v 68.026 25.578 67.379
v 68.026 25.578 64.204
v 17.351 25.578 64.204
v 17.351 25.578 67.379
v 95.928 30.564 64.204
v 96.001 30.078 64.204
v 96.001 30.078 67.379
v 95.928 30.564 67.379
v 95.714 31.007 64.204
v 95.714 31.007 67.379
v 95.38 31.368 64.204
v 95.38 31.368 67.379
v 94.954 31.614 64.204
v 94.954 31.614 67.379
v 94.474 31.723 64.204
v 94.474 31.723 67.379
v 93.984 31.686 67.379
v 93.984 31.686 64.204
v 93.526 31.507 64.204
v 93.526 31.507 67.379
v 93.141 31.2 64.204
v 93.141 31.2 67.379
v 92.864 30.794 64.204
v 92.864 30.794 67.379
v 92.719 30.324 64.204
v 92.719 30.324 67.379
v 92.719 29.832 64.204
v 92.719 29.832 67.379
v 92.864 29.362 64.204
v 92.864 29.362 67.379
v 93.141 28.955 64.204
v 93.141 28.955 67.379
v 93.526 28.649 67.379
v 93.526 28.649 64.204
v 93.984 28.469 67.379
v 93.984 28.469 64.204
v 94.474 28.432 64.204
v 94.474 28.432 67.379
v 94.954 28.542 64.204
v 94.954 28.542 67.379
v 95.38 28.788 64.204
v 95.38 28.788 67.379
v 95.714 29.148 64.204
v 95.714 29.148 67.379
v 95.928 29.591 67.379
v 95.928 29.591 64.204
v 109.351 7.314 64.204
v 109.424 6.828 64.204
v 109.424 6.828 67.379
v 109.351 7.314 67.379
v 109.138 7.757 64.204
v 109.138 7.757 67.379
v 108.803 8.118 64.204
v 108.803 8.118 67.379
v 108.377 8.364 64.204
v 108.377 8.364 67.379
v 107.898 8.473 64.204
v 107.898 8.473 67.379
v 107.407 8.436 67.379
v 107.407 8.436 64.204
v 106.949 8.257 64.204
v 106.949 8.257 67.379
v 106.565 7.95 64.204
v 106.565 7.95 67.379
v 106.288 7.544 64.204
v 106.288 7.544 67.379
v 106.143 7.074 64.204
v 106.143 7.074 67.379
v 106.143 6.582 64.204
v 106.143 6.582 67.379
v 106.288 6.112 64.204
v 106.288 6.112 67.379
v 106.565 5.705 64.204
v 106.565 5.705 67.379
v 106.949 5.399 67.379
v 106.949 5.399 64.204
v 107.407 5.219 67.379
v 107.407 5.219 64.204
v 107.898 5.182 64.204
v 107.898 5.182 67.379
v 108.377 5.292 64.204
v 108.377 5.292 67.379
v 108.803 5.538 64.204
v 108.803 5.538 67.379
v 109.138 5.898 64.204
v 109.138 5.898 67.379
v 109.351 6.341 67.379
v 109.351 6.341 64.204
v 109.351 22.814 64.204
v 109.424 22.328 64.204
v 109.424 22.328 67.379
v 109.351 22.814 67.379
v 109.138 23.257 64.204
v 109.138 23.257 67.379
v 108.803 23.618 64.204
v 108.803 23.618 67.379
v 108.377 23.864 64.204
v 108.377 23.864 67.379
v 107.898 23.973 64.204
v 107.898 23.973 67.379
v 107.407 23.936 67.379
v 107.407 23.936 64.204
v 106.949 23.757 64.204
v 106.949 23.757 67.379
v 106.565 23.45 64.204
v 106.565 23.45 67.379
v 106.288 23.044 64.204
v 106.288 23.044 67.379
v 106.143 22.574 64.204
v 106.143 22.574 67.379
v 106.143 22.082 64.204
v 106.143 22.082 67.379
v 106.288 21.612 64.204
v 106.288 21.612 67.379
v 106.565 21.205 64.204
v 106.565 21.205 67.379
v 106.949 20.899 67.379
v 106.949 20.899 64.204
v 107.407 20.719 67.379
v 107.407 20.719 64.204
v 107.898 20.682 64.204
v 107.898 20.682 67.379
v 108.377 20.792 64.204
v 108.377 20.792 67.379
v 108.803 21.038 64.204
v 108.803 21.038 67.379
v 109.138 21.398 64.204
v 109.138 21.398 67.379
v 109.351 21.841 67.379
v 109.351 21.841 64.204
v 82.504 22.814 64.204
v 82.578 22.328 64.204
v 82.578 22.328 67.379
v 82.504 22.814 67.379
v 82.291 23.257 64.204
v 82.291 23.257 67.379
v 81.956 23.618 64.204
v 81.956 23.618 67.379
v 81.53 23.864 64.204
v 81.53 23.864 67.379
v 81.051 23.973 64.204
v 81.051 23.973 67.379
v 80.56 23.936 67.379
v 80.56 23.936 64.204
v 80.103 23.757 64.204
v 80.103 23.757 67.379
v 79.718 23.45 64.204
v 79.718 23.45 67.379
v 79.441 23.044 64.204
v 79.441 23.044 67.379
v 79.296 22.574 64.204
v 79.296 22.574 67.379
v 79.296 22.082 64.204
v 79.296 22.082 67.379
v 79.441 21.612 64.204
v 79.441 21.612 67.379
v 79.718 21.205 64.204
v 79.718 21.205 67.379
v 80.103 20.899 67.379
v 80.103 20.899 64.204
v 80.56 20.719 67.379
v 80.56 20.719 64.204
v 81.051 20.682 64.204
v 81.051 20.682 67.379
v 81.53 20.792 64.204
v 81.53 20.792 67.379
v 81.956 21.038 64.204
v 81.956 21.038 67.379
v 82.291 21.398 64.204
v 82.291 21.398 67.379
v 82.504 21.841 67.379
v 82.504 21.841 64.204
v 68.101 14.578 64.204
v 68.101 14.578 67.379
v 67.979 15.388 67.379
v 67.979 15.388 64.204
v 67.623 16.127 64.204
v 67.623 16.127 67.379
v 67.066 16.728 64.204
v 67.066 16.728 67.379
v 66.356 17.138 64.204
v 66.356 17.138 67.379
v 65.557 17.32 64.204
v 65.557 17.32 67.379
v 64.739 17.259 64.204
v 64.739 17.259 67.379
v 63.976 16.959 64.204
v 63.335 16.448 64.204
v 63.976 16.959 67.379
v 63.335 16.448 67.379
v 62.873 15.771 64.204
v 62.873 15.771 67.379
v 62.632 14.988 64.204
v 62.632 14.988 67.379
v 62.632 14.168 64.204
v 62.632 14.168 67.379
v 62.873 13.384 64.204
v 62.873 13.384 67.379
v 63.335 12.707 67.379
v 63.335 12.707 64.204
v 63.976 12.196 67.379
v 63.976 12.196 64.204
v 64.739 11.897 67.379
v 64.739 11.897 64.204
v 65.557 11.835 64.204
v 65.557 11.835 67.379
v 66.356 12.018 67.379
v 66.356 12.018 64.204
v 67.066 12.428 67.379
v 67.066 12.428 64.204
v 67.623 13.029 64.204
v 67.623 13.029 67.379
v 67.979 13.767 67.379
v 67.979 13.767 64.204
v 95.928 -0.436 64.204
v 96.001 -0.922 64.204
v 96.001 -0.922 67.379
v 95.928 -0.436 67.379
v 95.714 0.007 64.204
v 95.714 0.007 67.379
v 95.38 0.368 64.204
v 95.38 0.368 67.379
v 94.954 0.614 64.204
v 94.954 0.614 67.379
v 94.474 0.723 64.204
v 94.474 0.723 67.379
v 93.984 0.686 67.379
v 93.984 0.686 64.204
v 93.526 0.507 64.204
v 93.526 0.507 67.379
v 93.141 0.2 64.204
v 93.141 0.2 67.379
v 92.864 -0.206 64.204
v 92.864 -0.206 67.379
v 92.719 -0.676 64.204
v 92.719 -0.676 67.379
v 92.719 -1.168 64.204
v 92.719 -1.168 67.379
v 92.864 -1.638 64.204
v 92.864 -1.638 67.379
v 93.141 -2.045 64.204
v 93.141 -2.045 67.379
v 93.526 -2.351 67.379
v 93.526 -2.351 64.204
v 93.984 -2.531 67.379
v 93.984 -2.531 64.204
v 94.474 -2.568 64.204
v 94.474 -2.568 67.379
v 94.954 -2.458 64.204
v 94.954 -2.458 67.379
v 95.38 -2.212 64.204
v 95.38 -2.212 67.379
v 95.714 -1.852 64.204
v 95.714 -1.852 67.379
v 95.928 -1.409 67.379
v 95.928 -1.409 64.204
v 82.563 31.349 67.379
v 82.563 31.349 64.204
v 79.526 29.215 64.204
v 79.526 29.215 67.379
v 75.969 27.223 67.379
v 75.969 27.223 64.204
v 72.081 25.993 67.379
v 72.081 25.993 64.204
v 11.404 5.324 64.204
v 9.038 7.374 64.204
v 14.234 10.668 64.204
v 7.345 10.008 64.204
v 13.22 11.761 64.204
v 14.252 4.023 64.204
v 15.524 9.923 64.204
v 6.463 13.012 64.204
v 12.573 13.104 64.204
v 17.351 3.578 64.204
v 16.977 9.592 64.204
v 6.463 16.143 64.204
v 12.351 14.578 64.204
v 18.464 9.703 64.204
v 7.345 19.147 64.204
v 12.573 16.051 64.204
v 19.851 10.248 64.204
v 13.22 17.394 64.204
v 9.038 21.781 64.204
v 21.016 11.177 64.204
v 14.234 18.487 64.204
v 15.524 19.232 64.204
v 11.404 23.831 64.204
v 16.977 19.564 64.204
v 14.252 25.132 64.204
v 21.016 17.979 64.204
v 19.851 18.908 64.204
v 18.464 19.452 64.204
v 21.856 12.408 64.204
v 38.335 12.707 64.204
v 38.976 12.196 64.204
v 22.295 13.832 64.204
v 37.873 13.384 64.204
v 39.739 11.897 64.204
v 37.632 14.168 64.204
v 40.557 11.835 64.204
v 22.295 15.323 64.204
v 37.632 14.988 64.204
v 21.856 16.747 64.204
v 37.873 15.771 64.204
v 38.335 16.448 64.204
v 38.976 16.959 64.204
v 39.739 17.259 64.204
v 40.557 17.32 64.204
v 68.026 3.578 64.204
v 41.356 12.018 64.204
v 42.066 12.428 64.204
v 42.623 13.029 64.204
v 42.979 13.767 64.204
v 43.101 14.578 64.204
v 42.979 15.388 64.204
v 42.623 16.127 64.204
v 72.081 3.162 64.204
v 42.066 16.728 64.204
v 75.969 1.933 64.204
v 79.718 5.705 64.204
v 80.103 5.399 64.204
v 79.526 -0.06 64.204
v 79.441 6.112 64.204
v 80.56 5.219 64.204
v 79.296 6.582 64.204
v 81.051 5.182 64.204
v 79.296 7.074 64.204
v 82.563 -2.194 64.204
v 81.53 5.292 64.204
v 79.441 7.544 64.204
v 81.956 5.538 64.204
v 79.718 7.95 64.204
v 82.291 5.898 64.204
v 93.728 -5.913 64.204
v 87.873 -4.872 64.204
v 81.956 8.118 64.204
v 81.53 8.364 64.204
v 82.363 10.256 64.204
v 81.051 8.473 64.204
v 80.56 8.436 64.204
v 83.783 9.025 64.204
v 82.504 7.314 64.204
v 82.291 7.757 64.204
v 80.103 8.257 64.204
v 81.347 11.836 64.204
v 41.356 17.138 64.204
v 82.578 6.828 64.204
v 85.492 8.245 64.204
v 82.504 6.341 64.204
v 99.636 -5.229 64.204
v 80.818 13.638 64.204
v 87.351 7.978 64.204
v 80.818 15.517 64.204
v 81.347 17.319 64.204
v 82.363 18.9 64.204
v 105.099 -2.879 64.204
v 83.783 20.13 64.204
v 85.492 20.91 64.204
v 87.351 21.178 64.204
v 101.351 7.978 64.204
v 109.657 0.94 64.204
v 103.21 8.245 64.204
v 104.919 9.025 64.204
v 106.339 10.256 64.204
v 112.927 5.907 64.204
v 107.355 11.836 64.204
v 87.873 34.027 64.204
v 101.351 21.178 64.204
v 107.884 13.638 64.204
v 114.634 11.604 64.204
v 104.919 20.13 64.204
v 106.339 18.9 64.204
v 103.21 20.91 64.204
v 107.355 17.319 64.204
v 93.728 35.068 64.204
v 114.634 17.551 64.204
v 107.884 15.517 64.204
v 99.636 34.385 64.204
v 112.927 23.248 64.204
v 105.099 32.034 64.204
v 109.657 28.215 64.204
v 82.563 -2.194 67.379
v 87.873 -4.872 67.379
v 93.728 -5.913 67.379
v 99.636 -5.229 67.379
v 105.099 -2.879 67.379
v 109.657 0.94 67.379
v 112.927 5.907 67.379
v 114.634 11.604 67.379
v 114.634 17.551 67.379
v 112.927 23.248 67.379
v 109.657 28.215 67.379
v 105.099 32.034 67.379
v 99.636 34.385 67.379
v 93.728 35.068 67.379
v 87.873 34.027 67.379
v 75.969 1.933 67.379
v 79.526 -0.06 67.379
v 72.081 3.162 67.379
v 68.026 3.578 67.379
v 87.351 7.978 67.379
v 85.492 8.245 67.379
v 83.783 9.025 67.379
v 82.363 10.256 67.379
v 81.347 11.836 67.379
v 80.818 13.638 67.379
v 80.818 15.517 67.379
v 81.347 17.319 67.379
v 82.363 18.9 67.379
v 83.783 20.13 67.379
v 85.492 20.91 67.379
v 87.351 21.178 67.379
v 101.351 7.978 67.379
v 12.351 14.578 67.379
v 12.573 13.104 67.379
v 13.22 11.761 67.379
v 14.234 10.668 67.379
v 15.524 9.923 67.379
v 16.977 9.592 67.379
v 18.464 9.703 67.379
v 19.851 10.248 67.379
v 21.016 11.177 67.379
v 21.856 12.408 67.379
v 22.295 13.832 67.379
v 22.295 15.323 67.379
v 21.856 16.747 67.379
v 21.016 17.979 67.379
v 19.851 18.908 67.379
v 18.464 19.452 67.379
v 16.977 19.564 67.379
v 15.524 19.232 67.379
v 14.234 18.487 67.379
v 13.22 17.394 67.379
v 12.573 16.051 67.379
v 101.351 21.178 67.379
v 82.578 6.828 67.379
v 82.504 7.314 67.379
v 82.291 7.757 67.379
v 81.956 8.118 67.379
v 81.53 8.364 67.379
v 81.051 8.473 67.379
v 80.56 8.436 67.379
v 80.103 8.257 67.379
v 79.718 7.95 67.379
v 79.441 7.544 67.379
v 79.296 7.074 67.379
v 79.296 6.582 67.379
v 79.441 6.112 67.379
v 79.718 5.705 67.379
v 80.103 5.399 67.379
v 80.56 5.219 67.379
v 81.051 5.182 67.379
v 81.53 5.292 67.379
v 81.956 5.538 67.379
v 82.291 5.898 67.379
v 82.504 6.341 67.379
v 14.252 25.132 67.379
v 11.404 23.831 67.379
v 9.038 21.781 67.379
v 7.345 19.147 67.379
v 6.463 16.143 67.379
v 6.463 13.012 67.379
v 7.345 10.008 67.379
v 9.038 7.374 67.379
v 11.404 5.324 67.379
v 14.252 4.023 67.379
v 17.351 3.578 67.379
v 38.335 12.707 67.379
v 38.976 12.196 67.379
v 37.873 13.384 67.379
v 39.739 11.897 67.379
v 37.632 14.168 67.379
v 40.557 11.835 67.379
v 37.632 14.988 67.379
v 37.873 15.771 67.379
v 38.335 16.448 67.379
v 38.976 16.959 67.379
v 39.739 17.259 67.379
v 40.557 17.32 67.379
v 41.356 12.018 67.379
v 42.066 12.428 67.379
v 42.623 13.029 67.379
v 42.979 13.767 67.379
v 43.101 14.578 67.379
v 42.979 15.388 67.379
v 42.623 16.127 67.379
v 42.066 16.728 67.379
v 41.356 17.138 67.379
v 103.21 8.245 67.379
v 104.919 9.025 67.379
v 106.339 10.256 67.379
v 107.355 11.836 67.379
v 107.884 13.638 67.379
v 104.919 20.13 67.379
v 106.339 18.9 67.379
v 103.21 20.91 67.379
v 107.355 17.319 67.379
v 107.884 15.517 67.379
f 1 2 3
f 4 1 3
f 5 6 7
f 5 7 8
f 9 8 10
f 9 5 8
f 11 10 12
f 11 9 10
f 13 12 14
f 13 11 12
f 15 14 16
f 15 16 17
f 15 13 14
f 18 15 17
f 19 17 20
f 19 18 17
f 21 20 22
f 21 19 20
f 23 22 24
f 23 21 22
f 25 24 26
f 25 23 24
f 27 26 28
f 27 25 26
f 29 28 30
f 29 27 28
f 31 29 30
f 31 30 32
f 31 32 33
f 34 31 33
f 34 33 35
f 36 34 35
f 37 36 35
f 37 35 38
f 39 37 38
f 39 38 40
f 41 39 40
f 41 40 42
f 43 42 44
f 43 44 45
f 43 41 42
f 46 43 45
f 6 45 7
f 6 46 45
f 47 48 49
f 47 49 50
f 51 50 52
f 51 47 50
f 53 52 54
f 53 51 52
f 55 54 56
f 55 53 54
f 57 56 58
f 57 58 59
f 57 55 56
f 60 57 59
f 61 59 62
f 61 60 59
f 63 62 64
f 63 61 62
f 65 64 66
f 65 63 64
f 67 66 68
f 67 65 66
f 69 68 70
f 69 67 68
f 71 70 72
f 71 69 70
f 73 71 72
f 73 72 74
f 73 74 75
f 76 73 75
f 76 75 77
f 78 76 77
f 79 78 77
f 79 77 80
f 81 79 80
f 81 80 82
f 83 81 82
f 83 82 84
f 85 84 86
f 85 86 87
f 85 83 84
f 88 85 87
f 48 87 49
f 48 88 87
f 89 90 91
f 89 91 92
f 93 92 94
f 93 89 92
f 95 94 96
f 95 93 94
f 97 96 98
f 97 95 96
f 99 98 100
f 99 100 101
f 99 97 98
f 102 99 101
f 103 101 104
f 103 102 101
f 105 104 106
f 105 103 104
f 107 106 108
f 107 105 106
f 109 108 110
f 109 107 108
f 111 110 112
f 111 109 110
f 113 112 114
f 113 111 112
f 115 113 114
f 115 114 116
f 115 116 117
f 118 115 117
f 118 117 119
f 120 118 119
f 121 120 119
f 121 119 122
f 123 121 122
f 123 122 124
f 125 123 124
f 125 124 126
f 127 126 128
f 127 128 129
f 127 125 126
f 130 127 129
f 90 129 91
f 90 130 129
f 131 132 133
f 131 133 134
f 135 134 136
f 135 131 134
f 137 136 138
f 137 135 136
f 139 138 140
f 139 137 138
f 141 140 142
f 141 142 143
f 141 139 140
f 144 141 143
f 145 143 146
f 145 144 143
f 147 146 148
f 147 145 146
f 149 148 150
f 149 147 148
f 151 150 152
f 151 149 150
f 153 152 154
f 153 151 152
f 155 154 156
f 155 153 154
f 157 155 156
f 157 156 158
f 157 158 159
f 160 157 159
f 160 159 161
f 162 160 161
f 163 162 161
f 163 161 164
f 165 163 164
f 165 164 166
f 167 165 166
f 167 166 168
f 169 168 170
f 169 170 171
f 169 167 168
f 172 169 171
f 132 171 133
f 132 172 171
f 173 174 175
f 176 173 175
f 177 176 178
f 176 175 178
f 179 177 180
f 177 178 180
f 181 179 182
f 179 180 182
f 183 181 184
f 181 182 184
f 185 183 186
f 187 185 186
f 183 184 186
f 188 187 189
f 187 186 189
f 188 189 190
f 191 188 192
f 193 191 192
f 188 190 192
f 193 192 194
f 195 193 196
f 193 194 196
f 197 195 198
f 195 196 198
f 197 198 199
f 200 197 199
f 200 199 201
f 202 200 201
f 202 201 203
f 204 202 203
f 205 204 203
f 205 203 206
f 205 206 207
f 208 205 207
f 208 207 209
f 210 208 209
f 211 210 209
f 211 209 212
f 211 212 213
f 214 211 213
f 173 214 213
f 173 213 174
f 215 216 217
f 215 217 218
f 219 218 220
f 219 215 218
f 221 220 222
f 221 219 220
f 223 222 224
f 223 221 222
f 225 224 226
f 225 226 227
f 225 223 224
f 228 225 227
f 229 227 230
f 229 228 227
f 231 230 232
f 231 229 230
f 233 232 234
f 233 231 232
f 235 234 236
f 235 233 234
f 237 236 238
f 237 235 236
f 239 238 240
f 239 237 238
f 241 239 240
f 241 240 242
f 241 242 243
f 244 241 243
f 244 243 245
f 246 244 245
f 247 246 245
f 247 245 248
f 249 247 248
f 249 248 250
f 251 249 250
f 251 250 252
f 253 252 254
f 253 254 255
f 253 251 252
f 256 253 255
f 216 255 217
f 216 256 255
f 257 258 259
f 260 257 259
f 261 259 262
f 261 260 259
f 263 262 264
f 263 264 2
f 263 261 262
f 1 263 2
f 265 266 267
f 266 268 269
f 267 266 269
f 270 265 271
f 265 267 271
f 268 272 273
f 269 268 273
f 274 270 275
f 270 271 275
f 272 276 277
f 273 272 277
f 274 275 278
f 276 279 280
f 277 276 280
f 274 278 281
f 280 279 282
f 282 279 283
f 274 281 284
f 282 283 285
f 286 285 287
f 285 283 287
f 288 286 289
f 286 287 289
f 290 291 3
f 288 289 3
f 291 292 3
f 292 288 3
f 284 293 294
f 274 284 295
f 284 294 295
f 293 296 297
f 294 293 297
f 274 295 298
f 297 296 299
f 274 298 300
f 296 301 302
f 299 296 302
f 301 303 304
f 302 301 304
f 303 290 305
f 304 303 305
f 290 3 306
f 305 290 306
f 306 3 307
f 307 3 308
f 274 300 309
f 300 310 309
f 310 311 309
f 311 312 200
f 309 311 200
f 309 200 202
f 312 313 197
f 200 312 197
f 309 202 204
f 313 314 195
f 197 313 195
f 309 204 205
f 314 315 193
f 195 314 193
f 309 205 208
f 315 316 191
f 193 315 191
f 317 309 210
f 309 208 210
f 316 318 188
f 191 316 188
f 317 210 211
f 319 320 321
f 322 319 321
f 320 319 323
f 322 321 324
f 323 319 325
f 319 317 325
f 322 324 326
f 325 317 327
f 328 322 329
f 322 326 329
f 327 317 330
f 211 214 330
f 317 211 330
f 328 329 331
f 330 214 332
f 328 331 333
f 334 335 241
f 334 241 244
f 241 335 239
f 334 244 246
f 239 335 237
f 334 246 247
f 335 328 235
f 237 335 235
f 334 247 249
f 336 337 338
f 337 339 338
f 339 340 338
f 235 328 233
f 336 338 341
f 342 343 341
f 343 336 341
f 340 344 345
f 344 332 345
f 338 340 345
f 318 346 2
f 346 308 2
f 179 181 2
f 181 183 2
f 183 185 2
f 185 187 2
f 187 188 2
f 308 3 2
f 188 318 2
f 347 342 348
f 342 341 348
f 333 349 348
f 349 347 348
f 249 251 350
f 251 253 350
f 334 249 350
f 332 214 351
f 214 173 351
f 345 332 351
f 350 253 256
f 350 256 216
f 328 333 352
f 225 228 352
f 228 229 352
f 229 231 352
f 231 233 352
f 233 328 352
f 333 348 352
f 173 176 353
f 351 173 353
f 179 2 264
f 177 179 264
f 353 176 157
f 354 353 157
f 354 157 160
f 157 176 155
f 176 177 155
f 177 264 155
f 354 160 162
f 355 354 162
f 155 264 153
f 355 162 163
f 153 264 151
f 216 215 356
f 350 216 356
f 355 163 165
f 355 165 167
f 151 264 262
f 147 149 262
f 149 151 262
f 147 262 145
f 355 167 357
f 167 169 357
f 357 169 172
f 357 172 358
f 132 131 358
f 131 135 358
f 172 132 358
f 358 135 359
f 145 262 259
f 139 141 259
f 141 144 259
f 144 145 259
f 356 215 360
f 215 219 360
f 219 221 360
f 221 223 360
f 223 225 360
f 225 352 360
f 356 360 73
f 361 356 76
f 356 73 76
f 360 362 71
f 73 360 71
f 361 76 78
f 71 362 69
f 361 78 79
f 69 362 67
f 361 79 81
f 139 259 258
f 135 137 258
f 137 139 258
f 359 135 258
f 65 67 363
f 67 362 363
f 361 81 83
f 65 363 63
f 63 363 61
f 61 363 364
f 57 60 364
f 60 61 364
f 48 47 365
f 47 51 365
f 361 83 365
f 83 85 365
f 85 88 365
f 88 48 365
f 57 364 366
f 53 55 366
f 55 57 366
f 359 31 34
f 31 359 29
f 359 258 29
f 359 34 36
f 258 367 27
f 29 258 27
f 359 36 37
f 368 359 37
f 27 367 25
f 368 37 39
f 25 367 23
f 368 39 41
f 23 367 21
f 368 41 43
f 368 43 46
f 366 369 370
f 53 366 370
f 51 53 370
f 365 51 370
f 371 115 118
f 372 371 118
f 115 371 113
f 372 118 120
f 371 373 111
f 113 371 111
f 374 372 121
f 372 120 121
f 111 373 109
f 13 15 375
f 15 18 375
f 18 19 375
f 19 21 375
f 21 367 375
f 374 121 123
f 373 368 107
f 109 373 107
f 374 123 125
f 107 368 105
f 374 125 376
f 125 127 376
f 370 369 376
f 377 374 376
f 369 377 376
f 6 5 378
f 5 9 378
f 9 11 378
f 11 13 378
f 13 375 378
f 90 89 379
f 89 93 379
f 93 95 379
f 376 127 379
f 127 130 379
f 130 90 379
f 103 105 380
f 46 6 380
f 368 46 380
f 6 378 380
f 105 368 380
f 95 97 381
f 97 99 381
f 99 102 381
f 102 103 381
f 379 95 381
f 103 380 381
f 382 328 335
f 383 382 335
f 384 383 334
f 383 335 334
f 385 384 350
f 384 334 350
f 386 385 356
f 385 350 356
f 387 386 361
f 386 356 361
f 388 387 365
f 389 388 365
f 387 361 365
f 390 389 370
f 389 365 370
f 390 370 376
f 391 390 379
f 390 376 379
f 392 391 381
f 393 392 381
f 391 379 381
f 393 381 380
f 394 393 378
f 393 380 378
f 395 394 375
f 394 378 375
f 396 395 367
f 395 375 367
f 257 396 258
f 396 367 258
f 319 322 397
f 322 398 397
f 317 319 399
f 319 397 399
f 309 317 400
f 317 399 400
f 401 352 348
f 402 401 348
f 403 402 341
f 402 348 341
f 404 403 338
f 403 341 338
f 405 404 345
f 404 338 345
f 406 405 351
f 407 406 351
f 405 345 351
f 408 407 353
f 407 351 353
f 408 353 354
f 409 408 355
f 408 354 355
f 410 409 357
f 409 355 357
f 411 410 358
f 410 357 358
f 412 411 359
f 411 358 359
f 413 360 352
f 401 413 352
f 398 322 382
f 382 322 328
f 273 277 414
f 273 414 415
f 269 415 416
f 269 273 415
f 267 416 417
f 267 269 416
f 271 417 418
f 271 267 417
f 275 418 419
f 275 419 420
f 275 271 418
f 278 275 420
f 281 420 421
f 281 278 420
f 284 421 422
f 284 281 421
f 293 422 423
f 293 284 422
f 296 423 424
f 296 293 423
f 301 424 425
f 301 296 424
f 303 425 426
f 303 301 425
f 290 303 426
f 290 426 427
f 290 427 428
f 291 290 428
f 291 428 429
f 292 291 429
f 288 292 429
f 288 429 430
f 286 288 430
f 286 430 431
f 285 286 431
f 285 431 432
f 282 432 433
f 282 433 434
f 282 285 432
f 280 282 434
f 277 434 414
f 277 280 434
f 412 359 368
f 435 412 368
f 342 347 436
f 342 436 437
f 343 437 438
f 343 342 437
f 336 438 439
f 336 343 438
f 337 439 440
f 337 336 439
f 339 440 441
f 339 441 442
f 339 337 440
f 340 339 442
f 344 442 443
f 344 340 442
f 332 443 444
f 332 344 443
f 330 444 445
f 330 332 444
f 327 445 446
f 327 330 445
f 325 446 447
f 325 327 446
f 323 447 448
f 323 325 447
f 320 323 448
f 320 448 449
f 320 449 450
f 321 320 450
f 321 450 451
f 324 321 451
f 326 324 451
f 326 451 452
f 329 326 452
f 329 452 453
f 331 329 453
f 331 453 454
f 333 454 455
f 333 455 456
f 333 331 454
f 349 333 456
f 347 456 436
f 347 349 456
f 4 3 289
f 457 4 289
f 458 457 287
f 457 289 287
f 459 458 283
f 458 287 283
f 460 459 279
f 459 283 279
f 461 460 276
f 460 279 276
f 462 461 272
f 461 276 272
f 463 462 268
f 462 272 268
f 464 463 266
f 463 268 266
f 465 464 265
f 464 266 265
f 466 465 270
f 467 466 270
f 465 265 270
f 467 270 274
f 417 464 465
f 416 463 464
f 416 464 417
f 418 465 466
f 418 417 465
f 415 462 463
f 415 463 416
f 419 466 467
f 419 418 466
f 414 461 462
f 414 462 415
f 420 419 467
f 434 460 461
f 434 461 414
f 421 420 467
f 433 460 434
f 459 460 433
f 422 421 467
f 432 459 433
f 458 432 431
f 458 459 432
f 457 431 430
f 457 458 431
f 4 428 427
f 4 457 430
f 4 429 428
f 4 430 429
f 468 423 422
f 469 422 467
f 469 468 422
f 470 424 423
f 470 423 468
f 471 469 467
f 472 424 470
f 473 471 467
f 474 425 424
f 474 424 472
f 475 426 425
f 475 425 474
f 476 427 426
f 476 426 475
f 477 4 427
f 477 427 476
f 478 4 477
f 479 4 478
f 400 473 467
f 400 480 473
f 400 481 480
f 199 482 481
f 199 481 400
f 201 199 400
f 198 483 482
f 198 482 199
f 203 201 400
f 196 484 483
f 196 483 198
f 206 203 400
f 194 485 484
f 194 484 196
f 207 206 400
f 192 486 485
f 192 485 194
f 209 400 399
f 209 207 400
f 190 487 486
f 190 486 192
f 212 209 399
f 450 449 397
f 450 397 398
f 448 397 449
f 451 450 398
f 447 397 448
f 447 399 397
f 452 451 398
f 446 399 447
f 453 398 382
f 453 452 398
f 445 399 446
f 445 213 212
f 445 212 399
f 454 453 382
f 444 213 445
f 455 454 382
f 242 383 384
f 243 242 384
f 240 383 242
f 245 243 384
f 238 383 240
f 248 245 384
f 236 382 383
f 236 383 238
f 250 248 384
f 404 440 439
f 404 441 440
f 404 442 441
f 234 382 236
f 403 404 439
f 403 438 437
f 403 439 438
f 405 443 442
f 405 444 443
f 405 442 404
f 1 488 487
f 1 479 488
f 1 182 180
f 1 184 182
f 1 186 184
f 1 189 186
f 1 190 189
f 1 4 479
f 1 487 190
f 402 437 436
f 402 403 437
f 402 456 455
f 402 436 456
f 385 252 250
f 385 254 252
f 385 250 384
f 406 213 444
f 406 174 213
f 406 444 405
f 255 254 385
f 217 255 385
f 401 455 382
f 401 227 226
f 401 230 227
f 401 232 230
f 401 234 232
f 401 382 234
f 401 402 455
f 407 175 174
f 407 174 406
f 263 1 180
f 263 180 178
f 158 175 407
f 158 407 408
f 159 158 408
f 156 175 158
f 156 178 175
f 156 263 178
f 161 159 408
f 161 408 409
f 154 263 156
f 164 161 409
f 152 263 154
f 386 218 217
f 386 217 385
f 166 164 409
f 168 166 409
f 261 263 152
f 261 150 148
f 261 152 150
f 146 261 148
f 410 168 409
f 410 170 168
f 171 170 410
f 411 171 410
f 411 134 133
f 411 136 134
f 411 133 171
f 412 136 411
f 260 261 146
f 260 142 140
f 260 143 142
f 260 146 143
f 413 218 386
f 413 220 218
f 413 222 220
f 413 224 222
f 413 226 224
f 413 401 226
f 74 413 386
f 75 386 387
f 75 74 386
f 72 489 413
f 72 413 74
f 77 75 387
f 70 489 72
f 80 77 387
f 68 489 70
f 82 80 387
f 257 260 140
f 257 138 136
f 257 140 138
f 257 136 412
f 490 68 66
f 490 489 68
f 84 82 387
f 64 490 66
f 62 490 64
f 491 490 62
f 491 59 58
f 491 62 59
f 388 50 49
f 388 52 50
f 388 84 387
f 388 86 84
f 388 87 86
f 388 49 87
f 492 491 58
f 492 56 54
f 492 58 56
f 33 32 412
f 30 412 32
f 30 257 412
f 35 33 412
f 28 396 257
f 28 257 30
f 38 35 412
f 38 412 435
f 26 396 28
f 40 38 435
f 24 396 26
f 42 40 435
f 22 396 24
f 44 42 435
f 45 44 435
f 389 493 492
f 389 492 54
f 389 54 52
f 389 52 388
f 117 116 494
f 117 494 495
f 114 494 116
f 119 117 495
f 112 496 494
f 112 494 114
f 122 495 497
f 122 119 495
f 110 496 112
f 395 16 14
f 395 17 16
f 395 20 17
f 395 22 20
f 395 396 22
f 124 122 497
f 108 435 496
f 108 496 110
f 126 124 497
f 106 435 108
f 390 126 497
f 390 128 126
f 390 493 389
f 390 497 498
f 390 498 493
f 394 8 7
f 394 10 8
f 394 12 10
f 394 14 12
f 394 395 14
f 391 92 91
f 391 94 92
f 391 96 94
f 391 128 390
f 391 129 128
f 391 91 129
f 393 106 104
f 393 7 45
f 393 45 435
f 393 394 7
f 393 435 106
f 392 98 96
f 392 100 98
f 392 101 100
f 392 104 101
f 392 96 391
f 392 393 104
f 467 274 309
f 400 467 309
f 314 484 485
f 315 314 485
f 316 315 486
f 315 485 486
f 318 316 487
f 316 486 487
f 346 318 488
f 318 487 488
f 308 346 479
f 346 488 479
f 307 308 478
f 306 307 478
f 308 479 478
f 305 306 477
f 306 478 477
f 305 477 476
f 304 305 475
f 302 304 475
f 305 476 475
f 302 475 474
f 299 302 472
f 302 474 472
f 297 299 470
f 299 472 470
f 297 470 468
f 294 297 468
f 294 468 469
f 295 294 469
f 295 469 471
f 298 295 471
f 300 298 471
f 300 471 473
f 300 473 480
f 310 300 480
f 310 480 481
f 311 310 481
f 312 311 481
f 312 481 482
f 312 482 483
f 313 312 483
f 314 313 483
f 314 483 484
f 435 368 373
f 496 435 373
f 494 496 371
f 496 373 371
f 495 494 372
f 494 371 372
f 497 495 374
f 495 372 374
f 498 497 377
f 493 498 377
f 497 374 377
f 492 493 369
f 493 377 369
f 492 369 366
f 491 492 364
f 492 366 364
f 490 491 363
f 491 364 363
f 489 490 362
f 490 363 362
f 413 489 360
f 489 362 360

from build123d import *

# Parameters (mm, degrees)
CROQUIS2_R                       = 1.65
CROQUIS2_R_2                     = 5
SALIENTE_EXTRUIR1_DEPTH          = 3.175
TALADRO_DE_MARGEN_PARA_M51_D     = 5.5
TALADRO_DE_MARGEN_PARA_M51_DEPTH = 6
TALADRO_DE_MARGEN_PARA_M51_TIP   = 1.652366702
REDONDEO1_R                      = 20


with BuildPart() as part:
    # Croquis2 → Saliente-Extruir1 (new body)
    with BuildSketch(Plane.XY.offset(64.203907482)):
        with BuildLine():
            Line((82.563009481, 31.349424269), (74.351031643, 25.577646382))
            Line((74.351031643, 25.577646382), (17.351031643, 25.577646382))
            ThreePointArc((17.351031643, 25.577646382), (6.351031643, 14.577646382), (17.351031643, 3.577646382))
            Line((17.351031643, 3.577646382), (74.351031643, 3.577646382))
            Line((74.351031643, 3.577646382), (82.563009481, -2.194131506))
            ThreePointArc((82.563009481, -2.194131506), (114.851031643, 14.577646382), (82.563009481, 31.349424269))
        make_face()
        with Locations((94.351031643, -0.922353618)):
            Circle(CROQUIS2_R, mode=Mode.SUBTRACT)
        with Locations((80.927637885, 6.827646382)):
            Circle(CROQUIS2_R, mode=Mode.SUBTRACT)
        with Locations((80.927637885, 22.327646382)):
            Circle(CROQUIS2_R, mode=Mode.SUBTRACT)
        with Locations((94.351031643, 30.077646382)):
            Circle(CROQUIS2_R, mode=Mode.SUBTRACT)
        with Locations((107.774425402, 22.327646382)):
            Circle(CROQUIS2_R, mode=Mode.SUBTRACT)
        with Locations((107.774425402, 6.827646382)):
            Circle(CROQUIS2_R, mode=Mode.SUBTRACT)
        with Locations(Location((17.351031643, 14.577646382, 0), (0, 0, 180))):
            Circle(CROQUIS2_R_2, mode=Mode.SUBTRACT)
        with BuildLine():
            Line((87.351031643, 21.177646382), (101.351031643, 21.177646382))
            ThreePointArc((101.351031643, 21.177646382), (107.951031643, 14.577646382), (101.351031643, 7.977646382))
            Line((101.351031643, 7.977646382), (87.351031643, 7.977646382))
            ThreePointArc((87.351031643, 7.977646382), (80.751031643, 14.577646382), (87.351031643, 21.177646382))
        make_face(mode=Mode.SUBTRACT)
    extrude(amount=SALIENTE_EXTRUIR1_DEPTH)

    # Taladro de margen para M51
    with Locations(Plane(origin=(0, 0, 64.203907482), x_dir=(-1, 0, 0), z_dir=(0, 0, -1))):
        with Locations((-65.351031643, 14.577646382), (-40.351031643, 14.577646382)):
            Hole(TALADRO_DE_MARGEN_PARA_M51_D / 2, depth=TALADRO_DE_MARGEN_PARA_M51_DEPTH)
            with Locations((0, 0, -(TALADRO_DE_MARGEN_PARA_M51_DEPTH + TALADRO_DE_MARGEN_PARA_M51_TIP / 2))):  # 118° drill point
                Cone(0, TALADRO_DE_MARGEN_PARA_M51_D / 2, TALADRO_DE_MARGEN_PARA_M51_TIP, mode=Mode.SUBTRACT)

    # Redondeo1
    redondeo1_edges = [part.edges().sort_by_distance(p)[0] for p in [
        (74.351031643, 3.577646382, 65.791407482),
        (74.351031643, 25.577646382, 65.791407482),
    ]]
    fillet(redondeo1_edges, radius=REDONDEO1_R)


solid = part.part
